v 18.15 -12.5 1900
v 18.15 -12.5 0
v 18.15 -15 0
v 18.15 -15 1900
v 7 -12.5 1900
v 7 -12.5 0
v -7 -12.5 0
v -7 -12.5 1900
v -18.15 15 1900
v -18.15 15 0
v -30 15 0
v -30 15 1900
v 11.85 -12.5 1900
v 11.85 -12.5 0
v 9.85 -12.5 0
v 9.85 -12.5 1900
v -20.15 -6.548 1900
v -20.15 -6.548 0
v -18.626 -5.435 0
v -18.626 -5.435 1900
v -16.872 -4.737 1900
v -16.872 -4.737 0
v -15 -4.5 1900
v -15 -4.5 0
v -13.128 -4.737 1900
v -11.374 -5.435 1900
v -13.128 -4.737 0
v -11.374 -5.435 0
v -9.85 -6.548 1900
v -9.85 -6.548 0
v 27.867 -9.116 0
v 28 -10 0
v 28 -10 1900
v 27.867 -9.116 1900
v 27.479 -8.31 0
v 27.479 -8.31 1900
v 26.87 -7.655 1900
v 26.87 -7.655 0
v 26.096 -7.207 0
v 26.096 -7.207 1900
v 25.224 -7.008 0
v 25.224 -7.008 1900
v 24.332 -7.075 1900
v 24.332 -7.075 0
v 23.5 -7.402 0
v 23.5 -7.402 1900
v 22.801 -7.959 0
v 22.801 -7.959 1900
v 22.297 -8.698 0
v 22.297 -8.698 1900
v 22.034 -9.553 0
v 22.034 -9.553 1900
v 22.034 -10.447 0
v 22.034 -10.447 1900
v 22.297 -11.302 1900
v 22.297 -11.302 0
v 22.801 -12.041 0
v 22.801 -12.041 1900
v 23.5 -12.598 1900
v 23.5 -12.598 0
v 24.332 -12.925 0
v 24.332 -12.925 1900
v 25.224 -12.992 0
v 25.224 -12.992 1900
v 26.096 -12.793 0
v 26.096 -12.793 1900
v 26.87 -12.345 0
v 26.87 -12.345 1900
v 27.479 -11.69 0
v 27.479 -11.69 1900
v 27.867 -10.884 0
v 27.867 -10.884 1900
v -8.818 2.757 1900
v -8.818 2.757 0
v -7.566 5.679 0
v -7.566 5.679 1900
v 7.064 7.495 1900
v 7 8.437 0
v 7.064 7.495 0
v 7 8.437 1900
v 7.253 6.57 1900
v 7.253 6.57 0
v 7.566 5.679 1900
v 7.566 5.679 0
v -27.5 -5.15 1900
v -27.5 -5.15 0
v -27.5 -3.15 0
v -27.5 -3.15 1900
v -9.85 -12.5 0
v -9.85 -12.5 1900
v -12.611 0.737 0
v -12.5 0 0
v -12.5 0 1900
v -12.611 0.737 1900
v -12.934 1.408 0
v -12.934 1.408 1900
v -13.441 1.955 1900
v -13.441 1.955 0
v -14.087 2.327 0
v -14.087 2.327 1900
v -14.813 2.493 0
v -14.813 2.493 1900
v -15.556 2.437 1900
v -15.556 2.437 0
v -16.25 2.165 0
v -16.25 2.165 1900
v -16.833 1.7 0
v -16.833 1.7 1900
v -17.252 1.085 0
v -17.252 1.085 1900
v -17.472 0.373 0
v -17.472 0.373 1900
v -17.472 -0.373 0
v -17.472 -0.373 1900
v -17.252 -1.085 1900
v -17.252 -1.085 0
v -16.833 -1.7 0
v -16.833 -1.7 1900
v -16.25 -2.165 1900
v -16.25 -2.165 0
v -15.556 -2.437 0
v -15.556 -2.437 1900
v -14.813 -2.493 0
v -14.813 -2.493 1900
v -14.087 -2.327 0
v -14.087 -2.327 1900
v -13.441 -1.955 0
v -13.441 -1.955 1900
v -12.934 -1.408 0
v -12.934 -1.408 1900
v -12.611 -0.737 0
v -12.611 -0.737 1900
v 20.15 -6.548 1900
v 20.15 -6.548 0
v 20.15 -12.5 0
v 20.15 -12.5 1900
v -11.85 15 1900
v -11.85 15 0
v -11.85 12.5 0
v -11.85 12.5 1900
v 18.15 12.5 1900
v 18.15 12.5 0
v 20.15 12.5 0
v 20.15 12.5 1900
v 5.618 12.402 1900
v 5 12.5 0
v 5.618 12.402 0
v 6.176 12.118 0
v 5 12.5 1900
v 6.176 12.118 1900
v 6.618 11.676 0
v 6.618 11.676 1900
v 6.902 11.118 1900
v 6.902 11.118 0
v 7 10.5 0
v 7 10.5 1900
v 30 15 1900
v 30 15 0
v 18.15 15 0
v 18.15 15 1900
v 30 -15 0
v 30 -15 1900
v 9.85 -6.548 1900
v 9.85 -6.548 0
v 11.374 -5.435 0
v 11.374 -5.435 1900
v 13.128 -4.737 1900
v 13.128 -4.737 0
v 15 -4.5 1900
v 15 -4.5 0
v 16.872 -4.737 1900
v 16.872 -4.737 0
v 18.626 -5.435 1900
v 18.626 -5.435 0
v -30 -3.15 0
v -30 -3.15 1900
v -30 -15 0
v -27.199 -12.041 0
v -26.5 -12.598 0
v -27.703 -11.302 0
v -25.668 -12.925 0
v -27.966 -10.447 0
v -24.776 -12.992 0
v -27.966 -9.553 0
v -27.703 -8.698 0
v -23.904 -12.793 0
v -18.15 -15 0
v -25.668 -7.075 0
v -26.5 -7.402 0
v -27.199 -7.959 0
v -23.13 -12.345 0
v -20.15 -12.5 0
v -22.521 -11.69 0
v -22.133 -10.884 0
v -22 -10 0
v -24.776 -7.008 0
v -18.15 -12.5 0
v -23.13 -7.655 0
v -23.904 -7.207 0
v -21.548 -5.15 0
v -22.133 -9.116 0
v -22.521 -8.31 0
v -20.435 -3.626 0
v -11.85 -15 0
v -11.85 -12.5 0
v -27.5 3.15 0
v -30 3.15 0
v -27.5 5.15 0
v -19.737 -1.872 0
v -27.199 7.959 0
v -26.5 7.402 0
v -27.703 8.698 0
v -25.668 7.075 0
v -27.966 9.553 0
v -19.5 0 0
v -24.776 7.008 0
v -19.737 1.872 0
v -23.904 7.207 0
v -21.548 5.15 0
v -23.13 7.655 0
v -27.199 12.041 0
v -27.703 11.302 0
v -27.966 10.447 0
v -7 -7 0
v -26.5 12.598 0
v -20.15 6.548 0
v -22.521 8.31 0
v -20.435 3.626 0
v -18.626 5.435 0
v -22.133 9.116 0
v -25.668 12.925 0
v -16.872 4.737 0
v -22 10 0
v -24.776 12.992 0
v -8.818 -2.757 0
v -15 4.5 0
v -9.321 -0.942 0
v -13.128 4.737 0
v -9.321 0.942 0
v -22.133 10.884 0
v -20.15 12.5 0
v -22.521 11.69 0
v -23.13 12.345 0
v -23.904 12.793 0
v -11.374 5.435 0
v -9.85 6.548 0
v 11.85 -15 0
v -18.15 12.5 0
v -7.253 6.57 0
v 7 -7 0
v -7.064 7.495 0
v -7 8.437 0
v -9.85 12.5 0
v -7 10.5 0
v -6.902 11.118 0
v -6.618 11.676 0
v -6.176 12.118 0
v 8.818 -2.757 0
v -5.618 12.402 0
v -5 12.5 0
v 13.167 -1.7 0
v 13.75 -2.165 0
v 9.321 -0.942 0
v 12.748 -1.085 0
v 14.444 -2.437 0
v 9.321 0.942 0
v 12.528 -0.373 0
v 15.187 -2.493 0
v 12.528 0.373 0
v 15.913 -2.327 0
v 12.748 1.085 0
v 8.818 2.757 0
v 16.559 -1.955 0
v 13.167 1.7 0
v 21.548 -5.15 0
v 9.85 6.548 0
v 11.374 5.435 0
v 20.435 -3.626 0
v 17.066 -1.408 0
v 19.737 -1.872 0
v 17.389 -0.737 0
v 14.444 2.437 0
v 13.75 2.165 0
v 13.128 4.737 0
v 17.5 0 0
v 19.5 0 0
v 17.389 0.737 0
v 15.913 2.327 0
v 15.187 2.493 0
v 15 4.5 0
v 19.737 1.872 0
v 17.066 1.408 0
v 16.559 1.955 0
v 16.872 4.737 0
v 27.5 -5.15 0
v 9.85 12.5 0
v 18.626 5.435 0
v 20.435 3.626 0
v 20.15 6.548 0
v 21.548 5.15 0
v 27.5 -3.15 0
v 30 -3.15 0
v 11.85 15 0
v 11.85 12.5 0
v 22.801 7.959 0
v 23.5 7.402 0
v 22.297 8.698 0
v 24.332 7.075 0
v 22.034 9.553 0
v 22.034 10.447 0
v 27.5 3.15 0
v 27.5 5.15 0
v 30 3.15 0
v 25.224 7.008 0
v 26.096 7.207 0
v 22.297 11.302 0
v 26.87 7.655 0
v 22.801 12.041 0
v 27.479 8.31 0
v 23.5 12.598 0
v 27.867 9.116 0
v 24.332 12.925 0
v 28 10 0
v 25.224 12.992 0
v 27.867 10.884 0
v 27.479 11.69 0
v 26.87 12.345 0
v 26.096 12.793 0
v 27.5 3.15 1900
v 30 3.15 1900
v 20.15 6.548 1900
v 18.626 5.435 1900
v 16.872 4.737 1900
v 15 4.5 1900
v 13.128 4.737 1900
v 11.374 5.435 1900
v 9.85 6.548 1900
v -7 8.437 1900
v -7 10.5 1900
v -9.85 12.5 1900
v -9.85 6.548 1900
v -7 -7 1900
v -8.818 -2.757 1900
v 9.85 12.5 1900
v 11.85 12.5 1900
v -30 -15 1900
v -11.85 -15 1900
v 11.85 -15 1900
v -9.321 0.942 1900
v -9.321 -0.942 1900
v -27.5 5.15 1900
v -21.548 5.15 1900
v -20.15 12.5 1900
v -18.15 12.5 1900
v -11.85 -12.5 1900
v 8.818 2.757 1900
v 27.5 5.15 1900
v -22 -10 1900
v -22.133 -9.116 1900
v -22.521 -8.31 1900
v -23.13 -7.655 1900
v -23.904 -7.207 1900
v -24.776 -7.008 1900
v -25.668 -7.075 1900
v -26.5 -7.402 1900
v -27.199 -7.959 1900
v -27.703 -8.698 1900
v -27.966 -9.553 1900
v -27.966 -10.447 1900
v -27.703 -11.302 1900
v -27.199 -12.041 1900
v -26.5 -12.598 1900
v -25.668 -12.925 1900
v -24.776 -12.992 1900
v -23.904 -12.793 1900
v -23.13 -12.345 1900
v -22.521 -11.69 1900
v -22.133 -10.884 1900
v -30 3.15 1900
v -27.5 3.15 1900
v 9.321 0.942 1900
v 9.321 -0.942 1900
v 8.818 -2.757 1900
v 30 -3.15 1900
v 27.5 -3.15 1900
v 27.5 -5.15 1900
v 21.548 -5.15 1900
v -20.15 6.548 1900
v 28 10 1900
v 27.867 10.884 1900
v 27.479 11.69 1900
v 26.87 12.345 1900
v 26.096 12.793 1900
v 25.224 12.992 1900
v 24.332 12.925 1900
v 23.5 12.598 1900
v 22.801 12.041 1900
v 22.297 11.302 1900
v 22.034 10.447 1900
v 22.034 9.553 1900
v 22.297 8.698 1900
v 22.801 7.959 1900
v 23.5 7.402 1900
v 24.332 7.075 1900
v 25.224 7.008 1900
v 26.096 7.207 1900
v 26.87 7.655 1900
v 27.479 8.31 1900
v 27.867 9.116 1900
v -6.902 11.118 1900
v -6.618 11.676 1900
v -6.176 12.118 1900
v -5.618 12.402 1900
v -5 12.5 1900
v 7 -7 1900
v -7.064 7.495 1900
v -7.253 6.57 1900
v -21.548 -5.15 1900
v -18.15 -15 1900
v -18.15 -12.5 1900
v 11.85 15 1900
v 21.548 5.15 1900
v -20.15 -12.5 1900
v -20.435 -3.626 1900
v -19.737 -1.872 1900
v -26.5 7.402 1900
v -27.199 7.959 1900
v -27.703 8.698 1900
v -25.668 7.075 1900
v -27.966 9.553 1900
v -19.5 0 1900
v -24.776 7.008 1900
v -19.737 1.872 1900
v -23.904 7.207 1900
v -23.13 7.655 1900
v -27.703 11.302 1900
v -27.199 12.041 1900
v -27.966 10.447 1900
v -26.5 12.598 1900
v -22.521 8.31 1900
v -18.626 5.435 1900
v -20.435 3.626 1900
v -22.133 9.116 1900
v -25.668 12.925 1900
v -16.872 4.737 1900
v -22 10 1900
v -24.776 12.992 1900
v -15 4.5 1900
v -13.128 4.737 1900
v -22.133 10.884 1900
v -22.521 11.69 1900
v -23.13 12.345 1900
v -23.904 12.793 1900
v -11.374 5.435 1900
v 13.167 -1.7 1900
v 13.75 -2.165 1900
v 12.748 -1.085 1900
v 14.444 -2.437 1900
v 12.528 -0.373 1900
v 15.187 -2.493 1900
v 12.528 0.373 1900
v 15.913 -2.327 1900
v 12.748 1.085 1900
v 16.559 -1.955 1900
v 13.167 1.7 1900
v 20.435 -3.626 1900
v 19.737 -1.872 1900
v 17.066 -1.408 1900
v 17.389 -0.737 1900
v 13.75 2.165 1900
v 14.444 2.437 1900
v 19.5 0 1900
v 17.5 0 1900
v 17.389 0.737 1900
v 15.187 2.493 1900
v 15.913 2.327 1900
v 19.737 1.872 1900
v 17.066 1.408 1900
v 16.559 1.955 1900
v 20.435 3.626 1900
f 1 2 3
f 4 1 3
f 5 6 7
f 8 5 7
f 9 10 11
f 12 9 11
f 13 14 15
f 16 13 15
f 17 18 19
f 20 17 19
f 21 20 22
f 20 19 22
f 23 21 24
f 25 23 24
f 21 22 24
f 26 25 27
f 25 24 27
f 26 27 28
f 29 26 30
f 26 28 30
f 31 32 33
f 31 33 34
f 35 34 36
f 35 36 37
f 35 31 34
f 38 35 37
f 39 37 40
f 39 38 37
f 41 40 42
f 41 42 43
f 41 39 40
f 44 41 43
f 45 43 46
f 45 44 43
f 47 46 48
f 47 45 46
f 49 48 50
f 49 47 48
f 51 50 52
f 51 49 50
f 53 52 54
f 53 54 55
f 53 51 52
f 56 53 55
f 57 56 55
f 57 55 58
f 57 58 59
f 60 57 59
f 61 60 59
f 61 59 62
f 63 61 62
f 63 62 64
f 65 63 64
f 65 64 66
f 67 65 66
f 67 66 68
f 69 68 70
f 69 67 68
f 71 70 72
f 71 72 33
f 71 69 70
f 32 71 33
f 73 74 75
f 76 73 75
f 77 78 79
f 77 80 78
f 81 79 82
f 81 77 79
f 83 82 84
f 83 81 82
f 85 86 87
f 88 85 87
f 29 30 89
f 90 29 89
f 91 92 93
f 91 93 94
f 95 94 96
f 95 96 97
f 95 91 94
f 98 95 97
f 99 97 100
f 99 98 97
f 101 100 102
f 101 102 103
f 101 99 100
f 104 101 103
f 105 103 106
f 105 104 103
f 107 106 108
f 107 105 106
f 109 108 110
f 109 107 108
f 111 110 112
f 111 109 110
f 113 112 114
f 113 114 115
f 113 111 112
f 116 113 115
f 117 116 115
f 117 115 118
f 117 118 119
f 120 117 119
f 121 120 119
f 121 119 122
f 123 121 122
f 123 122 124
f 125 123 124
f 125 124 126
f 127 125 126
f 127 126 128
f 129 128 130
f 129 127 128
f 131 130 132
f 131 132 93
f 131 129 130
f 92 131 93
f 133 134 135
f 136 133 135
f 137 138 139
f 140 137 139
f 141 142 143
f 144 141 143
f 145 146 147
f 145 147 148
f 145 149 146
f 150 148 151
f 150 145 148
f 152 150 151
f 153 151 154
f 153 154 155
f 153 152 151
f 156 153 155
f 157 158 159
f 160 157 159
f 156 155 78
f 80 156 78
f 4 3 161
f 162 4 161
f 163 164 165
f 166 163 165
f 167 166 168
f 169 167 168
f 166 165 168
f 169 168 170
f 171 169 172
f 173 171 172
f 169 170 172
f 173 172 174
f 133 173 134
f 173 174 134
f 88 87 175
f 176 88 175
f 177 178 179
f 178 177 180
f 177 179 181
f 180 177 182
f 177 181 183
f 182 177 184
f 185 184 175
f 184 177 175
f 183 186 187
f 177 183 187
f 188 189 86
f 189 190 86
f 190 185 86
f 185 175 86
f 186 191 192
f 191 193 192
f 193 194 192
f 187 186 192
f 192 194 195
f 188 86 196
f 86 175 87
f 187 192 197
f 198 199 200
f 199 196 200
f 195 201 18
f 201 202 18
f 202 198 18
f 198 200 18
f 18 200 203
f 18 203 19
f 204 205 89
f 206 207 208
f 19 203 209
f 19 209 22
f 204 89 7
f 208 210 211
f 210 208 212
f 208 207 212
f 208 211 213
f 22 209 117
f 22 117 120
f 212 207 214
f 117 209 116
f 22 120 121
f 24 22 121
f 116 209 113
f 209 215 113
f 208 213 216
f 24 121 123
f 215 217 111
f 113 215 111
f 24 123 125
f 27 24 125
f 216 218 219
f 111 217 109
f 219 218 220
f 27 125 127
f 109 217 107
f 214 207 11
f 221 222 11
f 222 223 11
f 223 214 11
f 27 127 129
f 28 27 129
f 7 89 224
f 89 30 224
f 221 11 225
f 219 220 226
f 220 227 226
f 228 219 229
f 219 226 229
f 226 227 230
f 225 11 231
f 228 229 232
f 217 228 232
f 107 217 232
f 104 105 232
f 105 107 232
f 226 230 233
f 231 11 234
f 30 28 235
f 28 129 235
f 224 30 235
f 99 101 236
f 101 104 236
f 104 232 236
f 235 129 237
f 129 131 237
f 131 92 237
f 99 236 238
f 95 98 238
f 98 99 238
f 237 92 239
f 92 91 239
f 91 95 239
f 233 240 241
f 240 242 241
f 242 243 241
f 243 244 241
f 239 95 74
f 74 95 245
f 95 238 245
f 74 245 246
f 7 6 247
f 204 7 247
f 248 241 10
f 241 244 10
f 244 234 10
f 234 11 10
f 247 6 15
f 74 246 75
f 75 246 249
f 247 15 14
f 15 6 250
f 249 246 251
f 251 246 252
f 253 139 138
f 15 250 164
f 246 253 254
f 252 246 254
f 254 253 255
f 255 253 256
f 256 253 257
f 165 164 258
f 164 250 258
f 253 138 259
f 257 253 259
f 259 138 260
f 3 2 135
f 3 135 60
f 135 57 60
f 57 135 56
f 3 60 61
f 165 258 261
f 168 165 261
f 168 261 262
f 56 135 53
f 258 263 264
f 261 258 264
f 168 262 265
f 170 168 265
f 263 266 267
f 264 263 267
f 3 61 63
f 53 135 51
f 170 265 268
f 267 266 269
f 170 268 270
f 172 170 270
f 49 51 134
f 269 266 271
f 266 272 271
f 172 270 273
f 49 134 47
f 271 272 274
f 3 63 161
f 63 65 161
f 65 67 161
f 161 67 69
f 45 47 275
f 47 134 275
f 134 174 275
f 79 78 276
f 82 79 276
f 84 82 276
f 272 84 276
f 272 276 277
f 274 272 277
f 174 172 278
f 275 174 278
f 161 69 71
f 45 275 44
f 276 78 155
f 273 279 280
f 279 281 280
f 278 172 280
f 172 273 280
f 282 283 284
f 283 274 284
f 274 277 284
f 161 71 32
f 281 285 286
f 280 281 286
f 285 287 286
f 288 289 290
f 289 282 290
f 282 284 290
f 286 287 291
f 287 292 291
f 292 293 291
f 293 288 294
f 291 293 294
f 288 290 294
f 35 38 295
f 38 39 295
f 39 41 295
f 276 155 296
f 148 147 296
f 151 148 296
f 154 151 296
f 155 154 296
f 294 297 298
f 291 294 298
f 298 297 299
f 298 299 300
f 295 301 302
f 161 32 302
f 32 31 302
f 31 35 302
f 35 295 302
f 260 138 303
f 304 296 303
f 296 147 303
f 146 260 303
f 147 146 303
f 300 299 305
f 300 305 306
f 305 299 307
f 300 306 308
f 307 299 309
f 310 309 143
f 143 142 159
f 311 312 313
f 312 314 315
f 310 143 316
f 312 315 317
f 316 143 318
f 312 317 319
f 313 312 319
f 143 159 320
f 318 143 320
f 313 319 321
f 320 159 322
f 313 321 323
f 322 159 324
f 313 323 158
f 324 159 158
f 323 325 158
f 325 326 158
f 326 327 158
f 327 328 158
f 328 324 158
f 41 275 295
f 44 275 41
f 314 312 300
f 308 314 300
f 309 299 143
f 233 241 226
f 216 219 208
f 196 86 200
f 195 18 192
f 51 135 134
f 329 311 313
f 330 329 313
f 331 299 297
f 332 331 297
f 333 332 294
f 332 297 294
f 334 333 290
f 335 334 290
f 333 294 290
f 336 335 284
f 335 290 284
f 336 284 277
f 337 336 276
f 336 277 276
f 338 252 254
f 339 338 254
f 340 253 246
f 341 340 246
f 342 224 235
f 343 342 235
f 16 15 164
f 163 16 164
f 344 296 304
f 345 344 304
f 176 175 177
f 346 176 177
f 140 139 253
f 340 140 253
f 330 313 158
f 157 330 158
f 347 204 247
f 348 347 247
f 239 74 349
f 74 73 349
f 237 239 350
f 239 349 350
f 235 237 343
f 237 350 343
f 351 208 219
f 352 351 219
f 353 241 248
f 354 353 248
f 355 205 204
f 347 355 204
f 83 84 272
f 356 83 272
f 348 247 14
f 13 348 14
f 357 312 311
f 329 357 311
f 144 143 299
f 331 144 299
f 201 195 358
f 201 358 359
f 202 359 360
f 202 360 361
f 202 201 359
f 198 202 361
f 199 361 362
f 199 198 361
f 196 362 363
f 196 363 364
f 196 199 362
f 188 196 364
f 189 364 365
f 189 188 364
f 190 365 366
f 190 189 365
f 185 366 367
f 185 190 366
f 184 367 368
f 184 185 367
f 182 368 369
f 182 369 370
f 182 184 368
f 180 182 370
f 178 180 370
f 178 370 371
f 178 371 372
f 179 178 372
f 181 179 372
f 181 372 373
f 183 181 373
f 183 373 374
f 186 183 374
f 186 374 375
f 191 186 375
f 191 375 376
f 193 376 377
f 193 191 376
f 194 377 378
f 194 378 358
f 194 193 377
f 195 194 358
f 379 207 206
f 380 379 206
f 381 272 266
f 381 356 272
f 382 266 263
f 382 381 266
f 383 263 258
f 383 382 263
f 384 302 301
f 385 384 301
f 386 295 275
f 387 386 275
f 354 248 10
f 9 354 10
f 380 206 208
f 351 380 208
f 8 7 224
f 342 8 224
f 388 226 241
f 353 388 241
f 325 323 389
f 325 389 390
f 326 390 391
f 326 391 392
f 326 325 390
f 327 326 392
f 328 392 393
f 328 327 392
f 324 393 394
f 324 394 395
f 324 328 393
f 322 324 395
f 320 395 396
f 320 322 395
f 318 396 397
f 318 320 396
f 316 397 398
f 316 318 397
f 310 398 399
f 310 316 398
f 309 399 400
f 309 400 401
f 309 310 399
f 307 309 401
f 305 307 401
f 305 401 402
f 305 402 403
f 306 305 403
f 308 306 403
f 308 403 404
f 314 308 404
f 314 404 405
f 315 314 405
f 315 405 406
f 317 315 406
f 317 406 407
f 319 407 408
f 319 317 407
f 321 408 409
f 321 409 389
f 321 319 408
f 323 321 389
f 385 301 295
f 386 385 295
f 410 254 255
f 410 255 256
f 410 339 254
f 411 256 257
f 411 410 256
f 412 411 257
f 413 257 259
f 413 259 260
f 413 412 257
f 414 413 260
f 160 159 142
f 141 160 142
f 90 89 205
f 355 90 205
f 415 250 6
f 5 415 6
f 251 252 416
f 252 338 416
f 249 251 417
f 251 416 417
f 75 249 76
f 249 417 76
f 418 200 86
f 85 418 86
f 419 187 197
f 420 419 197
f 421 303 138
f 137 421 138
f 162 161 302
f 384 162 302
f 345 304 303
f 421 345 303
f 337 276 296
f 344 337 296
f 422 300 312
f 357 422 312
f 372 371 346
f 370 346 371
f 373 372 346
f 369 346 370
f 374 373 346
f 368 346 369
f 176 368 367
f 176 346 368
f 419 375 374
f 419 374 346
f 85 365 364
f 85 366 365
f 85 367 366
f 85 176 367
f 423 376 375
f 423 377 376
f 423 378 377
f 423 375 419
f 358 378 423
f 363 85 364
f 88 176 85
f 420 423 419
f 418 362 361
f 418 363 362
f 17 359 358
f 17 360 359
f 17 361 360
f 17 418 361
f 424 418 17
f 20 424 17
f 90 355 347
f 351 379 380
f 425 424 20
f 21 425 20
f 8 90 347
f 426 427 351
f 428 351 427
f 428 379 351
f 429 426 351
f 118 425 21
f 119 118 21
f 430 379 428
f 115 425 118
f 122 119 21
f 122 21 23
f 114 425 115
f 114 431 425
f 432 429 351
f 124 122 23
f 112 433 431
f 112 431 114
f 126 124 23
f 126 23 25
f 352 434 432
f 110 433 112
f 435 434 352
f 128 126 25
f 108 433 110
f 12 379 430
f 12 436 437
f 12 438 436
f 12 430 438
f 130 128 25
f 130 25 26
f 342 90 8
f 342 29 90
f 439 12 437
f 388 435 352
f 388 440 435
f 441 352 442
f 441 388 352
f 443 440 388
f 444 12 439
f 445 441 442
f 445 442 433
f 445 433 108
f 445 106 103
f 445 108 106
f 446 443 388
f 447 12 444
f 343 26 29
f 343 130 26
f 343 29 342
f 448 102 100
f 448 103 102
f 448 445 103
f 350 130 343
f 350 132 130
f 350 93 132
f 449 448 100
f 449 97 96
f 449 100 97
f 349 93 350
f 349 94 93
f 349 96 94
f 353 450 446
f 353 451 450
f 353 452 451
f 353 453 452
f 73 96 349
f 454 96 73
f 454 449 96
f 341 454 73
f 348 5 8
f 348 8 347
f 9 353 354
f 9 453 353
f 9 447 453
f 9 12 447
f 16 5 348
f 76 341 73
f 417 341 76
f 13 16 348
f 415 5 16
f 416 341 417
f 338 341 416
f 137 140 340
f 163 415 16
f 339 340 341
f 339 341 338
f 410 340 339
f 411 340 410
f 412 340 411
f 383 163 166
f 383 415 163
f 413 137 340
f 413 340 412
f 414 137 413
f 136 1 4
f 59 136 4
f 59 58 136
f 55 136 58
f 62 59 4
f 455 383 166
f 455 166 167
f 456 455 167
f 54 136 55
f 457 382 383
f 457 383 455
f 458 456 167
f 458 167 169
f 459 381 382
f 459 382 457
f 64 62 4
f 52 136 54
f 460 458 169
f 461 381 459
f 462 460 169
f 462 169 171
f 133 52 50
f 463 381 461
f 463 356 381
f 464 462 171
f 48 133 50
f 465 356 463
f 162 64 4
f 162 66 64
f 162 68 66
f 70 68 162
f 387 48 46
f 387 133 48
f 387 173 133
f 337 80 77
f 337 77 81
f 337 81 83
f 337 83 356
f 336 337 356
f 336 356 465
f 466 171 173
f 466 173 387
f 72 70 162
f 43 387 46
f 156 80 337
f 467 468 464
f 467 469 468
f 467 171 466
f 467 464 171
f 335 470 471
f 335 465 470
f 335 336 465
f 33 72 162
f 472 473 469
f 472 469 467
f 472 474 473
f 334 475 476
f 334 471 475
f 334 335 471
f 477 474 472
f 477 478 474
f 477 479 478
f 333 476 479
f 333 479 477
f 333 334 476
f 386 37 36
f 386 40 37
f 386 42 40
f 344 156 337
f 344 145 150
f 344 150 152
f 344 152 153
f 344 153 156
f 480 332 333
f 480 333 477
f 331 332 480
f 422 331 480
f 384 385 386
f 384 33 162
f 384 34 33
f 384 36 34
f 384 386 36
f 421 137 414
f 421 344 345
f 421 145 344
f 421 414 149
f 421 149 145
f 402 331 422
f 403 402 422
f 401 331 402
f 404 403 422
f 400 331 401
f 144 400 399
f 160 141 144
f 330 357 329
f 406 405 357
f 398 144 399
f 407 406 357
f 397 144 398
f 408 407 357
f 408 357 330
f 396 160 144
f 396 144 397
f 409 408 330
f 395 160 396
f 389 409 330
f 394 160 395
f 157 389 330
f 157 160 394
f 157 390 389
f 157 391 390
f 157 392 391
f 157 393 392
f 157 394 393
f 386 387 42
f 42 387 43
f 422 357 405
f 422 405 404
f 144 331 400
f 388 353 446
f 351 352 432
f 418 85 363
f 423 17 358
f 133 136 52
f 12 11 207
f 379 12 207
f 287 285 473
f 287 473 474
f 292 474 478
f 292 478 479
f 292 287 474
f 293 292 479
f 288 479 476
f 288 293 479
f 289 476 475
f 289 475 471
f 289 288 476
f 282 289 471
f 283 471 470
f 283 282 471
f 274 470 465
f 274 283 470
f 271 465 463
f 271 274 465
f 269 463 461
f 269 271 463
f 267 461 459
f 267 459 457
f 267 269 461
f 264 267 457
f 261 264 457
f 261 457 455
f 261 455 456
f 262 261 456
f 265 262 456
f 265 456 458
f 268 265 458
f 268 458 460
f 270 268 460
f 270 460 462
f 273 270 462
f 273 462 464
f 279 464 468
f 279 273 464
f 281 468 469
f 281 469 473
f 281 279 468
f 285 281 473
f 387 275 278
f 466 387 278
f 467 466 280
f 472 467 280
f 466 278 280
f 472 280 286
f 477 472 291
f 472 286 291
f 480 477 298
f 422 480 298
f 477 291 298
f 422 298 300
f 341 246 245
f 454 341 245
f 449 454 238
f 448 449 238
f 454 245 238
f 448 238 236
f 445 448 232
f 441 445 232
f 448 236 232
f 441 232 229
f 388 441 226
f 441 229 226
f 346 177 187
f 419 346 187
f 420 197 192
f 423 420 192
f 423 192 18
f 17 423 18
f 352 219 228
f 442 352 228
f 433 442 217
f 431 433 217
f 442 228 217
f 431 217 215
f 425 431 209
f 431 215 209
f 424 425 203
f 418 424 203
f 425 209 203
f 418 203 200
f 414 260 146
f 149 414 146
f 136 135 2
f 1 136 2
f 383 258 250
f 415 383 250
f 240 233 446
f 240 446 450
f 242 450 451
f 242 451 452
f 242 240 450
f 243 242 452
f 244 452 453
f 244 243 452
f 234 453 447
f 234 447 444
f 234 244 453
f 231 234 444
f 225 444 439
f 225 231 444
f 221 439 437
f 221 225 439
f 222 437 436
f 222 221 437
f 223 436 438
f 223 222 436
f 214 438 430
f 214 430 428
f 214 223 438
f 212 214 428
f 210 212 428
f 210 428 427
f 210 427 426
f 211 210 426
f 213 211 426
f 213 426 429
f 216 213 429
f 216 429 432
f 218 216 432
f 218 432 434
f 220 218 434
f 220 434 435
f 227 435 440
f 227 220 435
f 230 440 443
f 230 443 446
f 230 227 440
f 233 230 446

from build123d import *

# Parameters (mm, degrees)
F0_R     = 3
F0_R_2   = 2.5
F1_DEPTH = 1900
F2_R     = 2
F3_R     = 7


# Not quite as in the source:
# - a feature names something its author has since deleted; it is built from what else it names


with BuildPart() as f1:
    # F0 (on Top) → F1 (new body)
    with BuildSketch(Plane.XY):
        with BuildLine():
            Line((18.15, -15), (30, -15))
            Line((30, -15), (30, -3.15))
            Line((30, -3.15), (27.5, -3.15))
            Line((27.5, -3.15), (27.5, -5.15))
            Line((27.5, -5.15), (21.5477069044, -5.15))
            ThreePointArc((21.5477069044, -5.15), (19.5, 0), (21.5477069044, 5.15))
            Line((21.5477069044, 5.15), (27.5, 5.15))
            Line((27.5, 5.15), (27.5, 3.15))
            Line((27.5, 3.15), (30, 3.15))
            Line((30, 3.15), (30, 15))
            Line((30, 15), (18.15, 15))
            Line((18.15, 15), (18.15, 12.5))
            Line((18.15, 12.5), (20.15, 12.5))
            Line((20.15, 12.5), (20.15, 6.5477069044))
            ThreePointArc((20.15, 6.5477069044), (15, 4.5), (9.85, 6.5477069044))
            Line((9.85, 6.5477069044), (9.85, 12.5))
            Line((9.85, 12.5), (11.85, 12.5))
            Line((11.85, 12.5), (11.85, 15))
            Line((11.85, 15), (-11.85, 15))
            Line((-11.85, 15), (-11.85, 12.5))
            Line((-11.85, 12.5), (-9.85, 12.5))
            Line((-9.85, 12.5), (-9.85, 6.5477069044))
            ThreePointArc((-9.85, 6.5477069044), (-15, 4.5), (-20.15, 6.5477069044))
            Line((-20.15, 6.5477069044), (-20.15, 12.5))
            Line((-20.15, 12.5), (-18.15, 12.5))
            Line((-18.15, 12.5), (-18.15, 15))
            Line((-18.15, 15), (-30, 15))
            Line((-30, 15), (-30, 3.15))
            Line((-30, 3.15), (-27.5, 3.15))
            Line((-27.5, 3.15), (-27.5, 5.15))
            Line((-27.5, 5.15), (-21.5477069044, 5.15))
            ThreePointArc((-21.5477069044, 5.15), (-19.5, 0), (-21.5477069044, -5.15))
            Line((-21.5477069044, -5.15), (-27.5, -5.15))
            Line((-27.5, -5.15), (-27.5, -3.15))
            Line((-27.5, -3.15), (-30, -3.15))
            Line((-30, -3.15), (-30, -15))
            Line((-30, -15), (-18.15, -15))
            Line((-18.15, -15), (-18.15, -12.5))
            Line((-18.15, -12.5), (-20.15, -12.5))
            Line((-20.15, -12.5), (-20.15, -6.5477069044))
            ThreePointArc((-20.15, -6.5477069044), (-15, -4.5), (-9.85, -6.5477069044))
            Line((-9.85, -6.5477069044), (-9.85, -12.5))
            Line((-9.85, -12.5), (-11.85, -12.5))
            Line((-11.85, -12.5), (-11.85, -15))
            Line((-11.85, -15), (11.85, -15))
            Line((11.85, -15), (11.85, -12.5))
            Line((11.85, -12.5), (9.85, -12.5))
            Line((9.85, -12.5), (9.85, -6.5477069044))
            ThreePointArc((9.85, -6.5477069044), (15, -4.5), (20.15, -6.5477069044))
            Line((20.15, -6.5477069044), (20.15, -12.5))
            Line((20.15, -12.5), (18.15, -12.5))
            Line((18.15, -12.5), (18.15, -15))
        make_face()
        with Locations((-25, -10)):
            Circle(F0_R, mode=Mode.SUBTRACT)
        with Locations((25, -10)):
            Circle(F0_R, mode=Mode.SUBTRACT)
        with Locations((-15, 0)):
            Circle(F0_R_2, mode=Mode.SUBTRACT)
        with Locations((-25, 10)):
            Circle(F0_R, mode=Mode.SUBTRACT)
        Polygon((-7, 7), (-7, 12.5), (0, 12.5), (7, 12.5), (7, 7), (10, 0), (7, -7), (7, -12.5), (0, -12.5), (-7, -12.5), (-7, -7), (-10, 0), align=None, mode=Mode.SUBTRACT)
        with Locations((15, 0)):
            Circle(F0_R_2, mode=Mode.SUBTRACT)
        with Locations((25, 10)):
            Circle(F0_R, mode=Mode.SUBTRACT)
    extrude(amount=F1_DEPTH)

    # F2
    f2_edges = [f1.edges().sort_by_distance(p)[0] for p in [
        (-7, 12.5, 950),
        (7, 12.5, 950),
    ]]
    fillet(f2_edges, radius=F2_R)

    # F3
    f3_edges = [f1.edges().sort_by_distance(p)[0] for p in [
        (-7, 7, 950),
        (-10, 0, 950),
        (7, 7, 950),
        (10, 0, 950),
    ]]
    fillet(f3_edges, radius=F3_R)


solid = f1.part
